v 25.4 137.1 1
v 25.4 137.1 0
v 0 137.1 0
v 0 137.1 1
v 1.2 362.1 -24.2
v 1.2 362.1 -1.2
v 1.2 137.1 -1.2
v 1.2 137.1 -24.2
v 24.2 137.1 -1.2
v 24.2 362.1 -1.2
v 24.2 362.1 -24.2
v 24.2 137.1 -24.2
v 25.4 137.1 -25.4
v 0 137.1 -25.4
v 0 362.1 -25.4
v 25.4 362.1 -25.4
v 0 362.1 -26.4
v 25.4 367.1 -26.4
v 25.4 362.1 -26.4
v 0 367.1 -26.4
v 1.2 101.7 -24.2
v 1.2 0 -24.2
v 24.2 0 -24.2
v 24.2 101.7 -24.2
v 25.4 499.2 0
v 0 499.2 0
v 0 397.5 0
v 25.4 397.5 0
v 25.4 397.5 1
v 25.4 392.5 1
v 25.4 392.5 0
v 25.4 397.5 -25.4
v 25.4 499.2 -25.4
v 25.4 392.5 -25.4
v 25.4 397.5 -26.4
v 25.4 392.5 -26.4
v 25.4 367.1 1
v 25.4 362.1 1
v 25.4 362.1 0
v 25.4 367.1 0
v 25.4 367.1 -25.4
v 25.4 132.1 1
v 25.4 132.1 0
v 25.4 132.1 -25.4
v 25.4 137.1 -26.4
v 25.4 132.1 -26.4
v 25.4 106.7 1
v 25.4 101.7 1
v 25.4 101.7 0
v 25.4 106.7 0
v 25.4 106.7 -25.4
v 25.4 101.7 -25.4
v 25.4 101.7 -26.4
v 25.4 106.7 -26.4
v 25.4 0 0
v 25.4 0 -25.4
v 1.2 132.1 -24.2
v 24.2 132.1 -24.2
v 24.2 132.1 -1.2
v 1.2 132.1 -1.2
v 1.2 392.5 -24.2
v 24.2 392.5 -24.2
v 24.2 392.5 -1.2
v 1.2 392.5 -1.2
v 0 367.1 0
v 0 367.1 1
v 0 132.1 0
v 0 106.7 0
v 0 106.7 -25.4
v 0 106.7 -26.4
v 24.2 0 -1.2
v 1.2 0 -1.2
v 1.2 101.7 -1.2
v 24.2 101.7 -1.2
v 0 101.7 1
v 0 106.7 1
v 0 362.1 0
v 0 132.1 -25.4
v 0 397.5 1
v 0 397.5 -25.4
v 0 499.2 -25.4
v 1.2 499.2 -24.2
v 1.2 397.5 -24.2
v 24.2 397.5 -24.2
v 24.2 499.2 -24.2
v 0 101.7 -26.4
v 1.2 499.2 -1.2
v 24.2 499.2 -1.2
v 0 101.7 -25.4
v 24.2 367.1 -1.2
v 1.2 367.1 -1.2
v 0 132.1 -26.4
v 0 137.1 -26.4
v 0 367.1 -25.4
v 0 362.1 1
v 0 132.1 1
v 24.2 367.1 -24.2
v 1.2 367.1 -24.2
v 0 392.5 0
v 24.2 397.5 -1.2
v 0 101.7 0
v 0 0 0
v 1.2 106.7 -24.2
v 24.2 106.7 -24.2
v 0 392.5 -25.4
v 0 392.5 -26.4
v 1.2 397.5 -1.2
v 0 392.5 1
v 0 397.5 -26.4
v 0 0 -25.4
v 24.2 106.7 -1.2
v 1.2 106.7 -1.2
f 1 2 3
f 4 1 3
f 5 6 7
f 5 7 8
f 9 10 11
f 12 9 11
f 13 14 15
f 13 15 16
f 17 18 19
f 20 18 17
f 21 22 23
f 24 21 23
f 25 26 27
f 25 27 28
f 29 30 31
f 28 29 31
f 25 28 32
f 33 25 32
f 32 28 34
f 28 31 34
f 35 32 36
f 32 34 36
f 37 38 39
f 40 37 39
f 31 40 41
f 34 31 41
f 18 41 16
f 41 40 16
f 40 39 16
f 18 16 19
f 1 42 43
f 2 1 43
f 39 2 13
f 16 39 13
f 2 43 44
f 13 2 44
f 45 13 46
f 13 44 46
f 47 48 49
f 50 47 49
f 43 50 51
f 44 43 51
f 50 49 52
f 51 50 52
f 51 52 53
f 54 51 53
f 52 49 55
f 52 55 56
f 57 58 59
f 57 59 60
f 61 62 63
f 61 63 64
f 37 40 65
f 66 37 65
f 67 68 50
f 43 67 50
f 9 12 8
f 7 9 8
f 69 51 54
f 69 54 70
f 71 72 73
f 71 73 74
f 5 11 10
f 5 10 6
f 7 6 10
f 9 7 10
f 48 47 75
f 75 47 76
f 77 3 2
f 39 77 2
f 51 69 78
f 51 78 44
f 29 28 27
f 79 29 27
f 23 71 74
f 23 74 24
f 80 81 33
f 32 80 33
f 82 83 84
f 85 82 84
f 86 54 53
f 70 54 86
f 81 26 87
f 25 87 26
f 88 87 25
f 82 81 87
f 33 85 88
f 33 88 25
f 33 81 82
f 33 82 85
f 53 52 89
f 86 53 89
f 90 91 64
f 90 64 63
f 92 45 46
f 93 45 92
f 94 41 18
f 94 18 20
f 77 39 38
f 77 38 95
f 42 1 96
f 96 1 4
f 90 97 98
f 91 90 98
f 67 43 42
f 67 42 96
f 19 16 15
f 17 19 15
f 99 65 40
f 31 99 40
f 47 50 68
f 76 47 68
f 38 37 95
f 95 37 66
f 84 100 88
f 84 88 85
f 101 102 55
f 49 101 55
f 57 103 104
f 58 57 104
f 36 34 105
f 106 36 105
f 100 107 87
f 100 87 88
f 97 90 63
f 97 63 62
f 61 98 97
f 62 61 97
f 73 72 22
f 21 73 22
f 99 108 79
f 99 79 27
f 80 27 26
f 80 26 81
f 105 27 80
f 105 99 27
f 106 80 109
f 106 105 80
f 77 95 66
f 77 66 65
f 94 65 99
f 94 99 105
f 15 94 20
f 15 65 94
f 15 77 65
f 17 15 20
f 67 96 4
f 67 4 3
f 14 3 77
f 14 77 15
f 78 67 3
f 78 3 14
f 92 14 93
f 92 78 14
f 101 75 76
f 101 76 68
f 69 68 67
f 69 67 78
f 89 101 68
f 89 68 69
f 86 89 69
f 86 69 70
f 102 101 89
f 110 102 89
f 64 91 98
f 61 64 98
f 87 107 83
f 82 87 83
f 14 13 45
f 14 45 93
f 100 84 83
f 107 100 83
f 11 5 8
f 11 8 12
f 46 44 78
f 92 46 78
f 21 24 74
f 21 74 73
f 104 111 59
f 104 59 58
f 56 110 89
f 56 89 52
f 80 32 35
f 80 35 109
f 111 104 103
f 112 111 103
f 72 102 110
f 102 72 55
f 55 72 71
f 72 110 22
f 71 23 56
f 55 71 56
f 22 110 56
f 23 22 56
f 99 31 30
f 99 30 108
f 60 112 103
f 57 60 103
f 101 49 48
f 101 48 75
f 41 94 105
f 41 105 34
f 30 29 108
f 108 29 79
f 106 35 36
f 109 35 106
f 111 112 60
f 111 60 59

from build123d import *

# Parameters (mm, degrees)
SKETCH1_W                = 25.4
SKETCH1_H                = 25.4
SKETCH1_W_2              = 23
SKETCH1_H_2              = 23
BOSS_EXTRUDE1_DEPTH      = 499.2
SKETCH3_W                = 25.4
SKETCH3_H                = 5
BOSS_EXTRUDE2_DEPTH      = 1
BOSS_EXTRUDE2_DEPTH_BACK = 26.4


with BuildPart() as part:
    # Sketch1 → Boss-Extrude1 (new body)
    with BuildSketch(Plane(origin=(0, 0, 0), x_dir=(1, 0, 0), z_dir=(0, 1, 0))):
        with Locations((12.7, 12.7)):
            Rectangle(SKETCH1_W, SKETCH1_H)
        with Locations((12.7, 12.7)):
            Rectangle(SKETCH1_W_2, SKETCH1_H_2, mode=Mode.SUBTRACT)
    extrude(amount=BOSS_EXTRUDE1_DEPTH)

    # Sketch3 → Boss-Extrude2 (add, two sides)
    with BuildSketch(Plane(origin=(0, 0, -25.4), x_dir=(-1, 0, 0), z_dir=(0, 0, -1))) as boss_extrude2_sk:
        with Locations((-12.7, 104.2)):
            Rectangle(SKETCH3_W, SKETCH3_H)
        with Locations((-12.7, 134.6)):
            Rectangle(SKETCH3_W, SKETCH3_H)
        with Locations((-12.7, 395)):
            Rectangle(SKETCH3_W, SKETCH3_H)
        with Locations((-12.7, 364.6)):
            Rectangle(SKETCH3_W, SKETCH3_H)
    extrude(amount=BOSS_EXTRUDE2_DEPTH)
    extrude(boss_extrude2_sk.sketch, amount=-BOSS_EXTRUDE2_DEPTH_BACK)


solid = part.part
